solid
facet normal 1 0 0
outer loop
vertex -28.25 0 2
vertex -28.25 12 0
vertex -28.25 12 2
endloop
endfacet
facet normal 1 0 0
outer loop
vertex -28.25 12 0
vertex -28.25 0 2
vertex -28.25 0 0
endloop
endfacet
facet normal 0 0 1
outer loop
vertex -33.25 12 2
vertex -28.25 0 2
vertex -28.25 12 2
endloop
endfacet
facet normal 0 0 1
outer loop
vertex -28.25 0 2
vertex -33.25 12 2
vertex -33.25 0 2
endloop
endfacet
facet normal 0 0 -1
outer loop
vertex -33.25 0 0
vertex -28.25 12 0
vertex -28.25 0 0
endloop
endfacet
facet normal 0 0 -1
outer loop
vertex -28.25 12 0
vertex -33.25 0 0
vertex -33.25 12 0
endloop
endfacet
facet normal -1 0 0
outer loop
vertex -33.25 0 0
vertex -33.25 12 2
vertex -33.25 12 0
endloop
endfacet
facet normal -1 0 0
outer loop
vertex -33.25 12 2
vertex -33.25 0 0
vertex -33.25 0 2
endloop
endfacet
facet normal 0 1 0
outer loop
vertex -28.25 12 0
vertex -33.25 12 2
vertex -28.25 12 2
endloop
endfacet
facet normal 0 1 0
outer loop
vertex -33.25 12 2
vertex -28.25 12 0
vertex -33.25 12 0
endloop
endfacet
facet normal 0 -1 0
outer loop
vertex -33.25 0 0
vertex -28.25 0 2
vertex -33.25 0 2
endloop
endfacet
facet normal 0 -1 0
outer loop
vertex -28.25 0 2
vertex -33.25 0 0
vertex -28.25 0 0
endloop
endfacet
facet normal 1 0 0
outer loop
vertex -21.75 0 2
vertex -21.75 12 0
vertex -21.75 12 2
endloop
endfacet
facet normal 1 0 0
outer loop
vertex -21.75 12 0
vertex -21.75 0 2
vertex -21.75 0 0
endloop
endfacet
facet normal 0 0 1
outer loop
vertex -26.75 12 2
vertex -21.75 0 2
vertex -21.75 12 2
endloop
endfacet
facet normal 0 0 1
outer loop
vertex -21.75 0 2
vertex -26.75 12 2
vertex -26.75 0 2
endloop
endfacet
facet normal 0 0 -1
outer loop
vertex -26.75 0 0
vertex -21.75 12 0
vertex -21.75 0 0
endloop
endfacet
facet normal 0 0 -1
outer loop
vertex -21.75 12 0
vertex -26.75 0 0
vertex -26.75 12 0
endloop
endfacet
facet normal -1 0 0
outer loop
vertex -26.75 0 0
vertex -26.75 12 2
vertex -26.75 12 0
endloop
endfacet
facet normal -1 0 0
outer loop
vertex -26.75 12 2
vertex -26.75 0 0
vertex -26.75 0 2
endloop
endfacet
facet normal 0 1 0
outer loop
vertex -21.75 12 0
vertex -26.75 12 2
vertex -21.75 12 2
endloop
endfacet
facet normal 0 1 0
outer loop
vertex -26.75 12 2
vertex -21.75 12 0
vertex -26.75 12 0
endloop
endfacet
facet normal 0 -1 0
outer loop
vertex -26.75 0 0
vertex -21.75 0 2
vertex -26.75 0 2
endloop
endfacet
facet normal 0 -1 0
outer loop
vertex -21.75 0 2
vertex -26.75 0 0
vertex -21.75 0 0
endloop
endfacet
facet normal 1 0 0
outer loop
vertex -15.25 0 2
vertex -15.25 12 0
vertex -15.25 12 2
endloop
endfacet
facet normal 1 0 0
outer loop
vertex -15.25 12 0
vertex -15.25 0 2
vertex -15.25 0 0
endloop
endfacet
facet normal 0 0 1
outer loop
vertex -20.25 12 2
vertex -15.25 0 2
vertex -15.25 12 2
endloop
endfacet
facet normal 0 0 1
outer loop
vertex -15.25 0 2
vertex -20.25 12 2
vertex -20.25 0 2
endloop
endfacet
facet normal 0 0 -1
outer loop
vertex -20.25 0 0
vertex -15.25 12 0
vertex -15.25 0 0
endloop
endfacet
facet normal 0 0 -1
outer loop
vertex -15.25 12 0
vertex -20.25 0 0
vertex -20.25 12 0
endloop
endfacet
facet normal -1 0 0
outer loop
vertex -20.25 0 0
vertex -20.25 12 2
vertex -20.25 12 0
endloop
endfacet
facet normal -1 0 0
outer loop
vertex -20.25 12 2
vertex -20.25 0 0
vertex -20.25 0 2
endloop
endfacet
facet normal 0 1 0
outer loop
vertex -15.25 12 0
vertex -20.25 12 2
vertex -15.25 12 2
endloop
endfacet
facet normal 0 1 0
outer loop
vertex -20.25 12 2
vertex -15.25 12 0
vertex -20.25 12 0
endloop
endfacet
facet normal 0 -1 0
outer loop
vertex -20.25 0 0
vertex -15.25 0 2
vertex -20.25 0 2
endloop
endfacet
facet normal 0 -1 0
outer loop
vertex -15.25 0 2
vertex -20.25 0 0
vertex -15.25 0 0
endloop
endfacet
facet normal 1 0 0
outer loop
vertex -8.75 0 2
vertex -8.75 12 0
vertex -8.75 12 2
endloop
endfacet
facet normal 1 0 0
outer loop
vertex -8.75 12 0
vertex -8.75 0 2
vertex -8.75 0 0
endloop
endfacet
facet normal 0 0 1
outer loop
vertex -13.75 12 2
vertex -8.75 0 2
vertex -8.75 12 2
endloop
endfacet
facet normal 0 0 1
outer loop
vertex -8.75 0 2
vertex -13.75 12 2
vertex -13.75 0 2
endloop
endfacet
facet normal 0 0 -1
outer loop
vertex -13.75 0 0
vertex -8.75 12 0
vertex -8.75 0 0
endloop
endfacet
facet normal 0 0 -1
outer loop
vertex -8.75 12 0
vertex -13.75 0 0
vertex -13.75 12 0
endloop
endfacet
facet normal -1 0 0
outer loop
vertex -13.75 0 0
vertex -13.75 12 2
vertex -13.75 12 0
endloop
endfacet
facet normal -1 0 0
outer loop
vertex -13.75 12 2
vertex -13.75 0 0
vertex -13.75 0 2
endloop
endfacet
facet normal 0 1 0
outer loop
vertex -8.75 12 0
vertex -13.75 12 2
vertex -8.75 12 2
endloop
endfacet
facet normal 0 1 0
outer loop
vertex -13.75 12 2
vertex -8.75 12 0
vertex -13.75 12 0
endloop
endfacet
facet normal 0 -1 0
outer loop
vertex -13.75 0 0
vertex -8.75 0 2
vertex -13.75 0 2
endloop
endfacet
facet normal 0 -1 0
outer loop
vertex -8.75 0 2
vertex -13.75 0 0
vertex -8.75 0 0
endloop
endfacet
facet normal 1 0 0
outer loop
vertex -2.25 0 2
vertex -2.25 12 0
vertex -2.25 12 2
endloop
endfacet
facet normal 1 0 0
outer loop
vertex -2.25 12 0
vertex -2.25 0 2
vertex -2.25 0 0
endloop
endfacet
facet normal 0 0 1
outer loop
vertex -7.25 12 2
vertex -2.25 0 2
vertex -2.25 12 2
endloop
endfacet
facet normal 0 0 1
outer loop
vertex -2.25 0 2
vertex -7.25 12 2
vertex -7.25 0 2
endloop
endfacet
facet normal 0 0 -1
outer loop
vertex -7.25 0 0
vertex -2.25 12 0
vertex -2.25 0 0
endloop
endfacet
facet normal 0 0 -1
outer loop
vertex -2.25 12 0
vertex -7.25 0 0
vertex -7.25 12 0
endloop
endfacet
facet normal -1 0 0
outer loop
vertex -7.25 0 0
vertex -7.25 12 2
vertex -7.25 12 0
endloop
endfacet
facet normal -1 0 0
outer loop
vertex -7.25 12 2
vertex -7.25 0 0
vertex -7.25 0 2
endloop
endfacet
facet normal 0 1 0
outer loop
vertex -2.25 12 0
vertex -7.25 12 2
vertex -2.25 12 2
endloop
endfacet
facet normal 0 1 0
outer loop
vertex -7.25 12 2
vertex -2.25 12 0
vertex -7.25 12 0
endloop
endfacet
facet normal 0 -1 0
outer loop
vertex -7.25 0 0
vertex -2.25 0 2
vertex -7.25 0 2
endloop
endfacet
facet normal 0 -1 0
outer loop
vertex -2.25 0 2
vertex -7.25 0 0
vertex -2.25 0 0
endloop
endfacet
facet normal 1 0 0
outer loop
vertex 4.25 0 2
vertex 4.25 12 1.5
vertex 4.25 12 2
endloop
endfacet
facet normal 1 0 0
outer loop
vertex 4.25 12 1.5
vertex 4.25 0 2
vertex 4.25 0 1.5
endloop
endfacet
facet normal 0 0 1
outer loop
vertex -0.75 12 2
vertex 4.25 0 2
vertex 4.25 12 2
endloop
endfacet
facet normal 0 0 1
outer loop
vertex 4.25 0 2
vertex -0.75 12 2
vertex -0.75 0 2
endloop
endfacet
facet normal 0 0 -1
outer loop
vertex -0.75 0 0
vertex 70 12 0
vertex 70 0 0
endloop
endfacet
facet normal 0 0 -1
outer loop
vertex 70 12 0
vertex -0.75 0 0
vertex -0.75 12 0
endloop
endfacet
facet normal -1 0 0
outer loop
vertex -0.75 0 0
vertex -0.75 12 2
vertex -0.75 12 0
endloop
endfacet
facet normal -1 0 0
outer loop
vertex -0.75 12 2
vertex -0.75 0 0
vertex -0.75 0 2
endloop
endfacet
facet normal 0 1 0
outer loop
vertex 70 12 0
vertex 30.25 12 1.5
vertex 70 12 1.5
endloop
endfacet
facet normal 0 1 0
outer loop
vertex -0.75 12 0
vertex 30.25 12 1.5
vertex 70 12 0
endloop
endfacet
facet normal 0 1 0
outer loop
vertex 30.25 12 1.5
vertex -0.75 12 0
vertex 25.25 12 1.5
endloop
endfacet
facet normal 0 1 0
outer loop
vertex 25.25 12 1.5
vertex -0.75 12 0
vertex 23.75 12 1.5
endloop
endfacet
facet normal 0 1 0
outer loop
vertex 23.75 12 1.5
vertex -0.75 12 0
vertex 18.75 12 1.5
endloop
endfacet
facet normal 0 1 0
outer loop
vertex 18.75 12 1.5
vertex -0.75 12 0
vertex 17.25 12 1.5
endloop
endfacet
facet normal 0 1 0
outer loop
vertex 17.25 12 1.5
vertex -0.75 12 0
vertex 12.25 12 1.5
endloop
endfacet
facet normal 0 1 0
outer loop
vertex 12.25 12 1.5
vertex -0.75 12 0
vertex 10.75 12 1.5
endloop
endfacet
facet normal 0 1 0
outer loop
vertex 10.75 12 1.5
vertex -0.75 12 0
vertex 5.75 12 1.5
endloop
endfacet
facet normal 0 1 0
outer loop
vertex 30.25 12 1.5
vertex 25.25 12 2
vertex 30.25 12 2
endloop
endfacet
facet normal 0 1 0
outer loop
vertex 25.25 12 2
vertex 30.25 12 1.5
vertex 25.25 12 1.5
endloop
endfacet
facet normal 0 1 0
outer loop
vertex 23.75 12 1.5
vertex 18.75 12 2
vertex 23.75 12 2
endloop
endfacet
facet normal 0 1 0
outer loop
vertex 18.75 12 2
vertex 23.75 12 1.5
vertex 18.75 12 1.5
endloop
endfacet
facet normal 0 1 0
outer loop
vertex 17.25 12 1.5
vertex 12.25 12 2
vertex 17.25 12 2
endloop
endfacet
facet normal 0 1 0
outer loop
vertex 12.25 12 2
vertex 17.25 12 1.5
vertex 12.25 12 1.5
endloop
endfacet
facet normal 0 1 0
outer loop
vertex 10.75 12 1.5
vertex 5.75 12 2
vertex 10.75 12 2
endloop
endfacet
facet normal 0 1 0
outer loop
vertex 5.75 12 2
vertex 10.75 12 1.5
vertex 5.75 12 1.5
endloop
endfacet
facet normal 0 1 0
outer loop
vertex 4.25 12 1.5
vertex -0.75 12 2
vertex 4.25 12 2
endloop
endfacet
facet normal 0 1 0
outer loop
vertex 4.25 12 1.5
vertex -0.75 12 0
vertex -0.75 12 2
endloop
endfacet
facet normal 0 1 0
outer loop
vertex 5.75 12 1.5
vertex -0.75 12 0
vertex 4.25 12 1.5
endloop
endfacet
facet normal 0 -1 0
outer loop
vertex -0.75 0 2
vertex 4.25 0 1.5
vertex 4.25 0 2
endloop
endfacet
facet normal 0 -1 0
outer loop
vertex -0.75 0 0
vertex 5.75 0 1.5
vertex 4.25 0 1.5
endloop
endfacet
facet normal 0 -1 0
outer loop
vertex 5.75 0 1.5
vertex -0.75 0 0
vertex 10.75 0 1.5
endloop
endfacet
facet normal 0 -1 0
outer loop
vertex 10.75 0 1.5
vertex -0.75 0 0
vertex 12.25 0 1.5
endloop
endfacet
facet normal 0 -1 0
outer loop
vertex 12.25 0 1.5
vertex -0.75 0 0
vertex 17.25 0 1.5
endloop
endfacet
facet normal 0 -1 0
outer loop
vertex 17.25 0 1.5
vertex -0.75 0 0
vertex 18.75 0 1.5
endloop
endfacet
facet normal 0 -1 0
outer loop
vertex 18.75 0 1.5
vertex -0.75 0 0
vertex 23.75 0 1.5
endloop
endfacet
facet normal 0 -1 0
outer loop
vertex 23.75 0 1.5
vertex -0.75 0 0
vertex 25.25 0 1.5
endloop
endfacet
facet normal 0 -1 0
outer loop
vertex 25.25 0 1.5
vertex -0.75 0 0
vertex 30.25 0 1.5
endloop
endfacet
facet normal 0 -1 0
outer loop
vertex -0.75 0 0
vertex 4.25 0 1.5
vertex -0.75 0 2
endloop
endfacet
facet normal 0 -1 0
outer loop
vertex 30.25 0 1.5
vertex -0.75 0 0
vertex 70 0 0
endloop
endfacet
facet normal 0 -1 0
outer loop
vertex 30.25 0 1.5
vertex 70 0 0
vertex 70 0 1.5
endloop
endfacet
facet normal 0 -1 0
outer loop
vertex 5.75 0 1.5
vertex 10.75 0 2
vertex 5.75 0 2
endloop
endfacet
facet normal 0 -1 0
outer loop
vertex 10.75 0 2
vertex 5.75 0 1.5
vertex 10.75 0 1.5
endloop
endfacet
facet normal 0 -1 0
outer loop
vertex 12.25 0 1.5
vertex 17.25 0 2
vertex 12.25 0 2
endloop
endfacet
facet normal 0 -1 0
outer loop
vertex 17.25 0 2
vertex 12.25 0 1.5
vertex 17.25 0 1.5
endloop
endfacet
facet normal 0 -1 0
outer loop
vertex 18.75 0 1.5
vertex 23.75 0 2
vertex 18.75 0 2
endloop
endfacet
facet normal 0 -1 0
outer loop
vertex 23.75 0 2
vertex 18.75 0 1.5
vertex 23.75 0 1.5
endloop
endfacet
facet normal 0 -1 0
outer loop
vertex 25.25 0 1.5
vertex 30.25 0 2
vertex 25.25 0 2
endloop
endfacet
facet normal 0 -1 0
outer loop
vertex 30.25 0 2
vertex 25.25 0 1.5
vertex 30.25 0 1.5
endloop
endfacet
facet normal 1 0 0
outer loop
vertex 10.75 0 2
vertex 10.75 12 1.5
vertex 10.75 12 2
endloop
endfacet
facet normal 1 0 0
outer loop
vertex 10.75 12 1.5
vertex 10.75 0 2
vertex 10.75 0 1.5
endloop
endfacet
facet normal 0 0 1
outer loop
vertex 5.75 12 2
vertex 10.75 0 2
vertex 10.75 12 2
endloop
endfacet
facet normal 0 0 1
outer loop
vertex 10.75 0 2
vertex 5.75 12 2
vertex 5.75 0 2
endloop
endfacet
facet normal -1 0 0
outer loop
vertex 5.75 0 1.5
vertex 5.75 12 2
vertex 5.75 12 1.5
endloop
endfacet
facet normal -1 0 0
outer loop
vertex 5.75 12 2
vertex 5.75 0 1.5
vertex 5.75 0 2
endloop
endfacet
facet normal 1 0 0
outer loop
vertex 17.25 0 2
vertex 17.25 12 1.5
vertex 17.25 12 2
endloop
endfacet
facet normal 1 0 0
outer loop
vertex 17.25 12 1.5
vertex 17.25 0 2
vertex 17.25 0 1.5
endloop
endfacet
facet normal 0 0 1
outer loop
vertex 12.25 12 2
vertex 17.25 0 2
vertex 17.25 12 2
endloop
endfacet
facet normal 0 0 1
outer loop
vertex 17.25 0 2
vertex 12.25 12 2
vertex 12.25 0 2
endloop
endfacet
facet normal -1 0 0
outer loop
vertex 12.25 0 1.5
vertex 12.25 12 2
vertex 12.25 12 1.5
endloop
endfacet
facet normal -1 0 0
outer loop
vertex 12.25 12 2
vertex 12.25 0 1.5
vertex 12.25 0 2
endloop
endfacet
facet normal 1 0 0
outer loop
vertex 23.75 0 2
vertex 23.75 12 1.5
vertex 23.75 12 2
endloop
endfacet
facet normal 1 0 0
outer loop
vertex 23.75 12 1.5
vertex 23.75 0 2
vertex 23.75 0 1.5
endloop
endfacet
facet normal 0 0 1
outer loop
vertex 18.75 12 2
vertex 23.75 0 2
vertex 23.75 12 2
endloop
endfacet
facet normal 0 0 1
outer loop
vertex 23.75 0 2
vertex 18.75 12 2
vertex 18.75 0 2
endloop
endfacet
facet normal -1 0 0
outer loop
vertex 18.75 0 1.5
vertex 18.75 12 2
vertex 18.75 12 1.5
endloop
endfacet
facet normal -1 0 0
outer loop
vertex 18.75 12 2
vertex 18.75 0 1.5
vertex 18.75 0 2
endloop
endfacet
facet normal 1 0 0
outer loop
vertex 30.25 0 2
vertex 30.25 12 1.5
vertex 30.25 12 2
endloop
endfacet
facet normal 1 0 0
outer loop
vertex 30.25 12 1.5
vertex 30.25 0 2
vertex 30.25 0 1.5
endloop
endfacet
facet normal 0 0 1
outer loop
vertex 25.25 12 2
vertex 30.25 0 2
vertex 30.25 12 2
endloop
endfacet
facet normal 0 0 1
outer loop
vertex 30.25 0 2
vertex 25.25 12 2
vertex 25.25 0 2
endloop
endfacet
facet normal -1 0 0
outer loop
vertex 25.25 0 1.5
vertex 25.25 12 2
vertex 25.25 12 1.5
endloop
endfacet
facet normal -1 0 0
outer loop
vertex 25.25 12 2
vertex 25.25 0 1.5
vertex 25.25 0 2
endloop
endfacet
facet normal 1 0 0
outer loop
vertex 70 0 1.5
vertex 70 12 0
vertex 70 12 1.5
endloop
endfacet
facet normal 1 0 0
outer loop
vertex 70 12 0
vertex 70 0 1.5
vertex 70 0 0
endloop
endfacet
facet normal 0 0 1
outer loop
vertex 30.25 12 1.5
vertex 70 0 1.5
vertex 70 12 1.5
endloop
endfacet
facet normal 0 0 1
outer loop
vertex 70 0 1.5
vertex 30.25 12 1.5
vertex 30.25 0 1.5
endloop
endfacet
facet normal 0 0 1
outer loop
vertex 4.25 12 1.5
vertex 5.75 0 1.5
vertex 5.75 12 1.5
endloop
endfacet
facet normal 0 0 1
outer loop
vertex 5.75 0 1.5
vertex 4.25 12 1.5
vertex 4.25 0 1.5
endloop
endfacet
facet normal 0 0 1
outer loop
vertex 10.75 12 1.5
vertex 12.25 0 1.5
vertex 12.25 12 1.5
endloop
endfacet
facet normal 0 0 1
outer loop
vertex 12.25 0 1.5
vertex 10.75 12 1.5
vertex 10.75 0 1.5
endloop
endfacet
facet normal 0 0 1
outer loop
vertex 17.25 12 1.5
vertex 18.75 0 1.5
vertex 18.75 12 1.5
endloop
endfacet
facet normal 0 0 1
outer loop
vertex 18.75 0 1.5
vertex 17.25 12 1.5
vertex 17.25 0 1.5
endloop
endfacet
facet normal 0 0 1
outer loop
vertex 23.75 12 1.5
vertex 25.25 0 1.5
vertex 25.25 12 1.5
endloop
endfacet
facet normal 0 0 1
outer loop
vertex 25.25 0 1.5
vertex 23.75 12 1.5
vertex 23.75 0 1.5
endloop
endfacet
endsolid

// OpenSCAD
// 10-well comb for agarose gel casting, printed lying flat
// Units: mm

// ---- Parameters ----
plate_t      = 1.5;    // plate thickness (Z)
spine_l      = 70;     // spine length (X)
spine_w      = 12;     // spine width (Y)
teeth_n      = 10;     // number of teeth
teeth_w      = 5.0;    // tooth width (X)
teeth_l      = 12;     // tooth length (Y)
teeth_gap    = 1.5;    // gap between teeth (X)
overcut      = 0.5;    // extra length on cutting shapes past faces (Z)

// ---- Derived ----
teeth_f = teeth_n * teeth_w + (teeth_n + 1) * teeth_gap;  // total row length (X)
y0      = -spine_w / 2 + teeth_l / 2;                     // aligns teeth with -Y edge

// ---- Model ----
union() {
    // Spine (back bar)
    translate([0, 0, 0])
        cube([spine_l, spine_w, plate_t]);

    // Teeth, centred on spine in X
    for (i = [0 : teeth_n - 1]) {
        translate([-teeth_f / 2 + i * (teeth_w + teeth_gap), y0, 0])
            cube([teeth_w, teeth_l, plate_t + overcut]);
    }
}
